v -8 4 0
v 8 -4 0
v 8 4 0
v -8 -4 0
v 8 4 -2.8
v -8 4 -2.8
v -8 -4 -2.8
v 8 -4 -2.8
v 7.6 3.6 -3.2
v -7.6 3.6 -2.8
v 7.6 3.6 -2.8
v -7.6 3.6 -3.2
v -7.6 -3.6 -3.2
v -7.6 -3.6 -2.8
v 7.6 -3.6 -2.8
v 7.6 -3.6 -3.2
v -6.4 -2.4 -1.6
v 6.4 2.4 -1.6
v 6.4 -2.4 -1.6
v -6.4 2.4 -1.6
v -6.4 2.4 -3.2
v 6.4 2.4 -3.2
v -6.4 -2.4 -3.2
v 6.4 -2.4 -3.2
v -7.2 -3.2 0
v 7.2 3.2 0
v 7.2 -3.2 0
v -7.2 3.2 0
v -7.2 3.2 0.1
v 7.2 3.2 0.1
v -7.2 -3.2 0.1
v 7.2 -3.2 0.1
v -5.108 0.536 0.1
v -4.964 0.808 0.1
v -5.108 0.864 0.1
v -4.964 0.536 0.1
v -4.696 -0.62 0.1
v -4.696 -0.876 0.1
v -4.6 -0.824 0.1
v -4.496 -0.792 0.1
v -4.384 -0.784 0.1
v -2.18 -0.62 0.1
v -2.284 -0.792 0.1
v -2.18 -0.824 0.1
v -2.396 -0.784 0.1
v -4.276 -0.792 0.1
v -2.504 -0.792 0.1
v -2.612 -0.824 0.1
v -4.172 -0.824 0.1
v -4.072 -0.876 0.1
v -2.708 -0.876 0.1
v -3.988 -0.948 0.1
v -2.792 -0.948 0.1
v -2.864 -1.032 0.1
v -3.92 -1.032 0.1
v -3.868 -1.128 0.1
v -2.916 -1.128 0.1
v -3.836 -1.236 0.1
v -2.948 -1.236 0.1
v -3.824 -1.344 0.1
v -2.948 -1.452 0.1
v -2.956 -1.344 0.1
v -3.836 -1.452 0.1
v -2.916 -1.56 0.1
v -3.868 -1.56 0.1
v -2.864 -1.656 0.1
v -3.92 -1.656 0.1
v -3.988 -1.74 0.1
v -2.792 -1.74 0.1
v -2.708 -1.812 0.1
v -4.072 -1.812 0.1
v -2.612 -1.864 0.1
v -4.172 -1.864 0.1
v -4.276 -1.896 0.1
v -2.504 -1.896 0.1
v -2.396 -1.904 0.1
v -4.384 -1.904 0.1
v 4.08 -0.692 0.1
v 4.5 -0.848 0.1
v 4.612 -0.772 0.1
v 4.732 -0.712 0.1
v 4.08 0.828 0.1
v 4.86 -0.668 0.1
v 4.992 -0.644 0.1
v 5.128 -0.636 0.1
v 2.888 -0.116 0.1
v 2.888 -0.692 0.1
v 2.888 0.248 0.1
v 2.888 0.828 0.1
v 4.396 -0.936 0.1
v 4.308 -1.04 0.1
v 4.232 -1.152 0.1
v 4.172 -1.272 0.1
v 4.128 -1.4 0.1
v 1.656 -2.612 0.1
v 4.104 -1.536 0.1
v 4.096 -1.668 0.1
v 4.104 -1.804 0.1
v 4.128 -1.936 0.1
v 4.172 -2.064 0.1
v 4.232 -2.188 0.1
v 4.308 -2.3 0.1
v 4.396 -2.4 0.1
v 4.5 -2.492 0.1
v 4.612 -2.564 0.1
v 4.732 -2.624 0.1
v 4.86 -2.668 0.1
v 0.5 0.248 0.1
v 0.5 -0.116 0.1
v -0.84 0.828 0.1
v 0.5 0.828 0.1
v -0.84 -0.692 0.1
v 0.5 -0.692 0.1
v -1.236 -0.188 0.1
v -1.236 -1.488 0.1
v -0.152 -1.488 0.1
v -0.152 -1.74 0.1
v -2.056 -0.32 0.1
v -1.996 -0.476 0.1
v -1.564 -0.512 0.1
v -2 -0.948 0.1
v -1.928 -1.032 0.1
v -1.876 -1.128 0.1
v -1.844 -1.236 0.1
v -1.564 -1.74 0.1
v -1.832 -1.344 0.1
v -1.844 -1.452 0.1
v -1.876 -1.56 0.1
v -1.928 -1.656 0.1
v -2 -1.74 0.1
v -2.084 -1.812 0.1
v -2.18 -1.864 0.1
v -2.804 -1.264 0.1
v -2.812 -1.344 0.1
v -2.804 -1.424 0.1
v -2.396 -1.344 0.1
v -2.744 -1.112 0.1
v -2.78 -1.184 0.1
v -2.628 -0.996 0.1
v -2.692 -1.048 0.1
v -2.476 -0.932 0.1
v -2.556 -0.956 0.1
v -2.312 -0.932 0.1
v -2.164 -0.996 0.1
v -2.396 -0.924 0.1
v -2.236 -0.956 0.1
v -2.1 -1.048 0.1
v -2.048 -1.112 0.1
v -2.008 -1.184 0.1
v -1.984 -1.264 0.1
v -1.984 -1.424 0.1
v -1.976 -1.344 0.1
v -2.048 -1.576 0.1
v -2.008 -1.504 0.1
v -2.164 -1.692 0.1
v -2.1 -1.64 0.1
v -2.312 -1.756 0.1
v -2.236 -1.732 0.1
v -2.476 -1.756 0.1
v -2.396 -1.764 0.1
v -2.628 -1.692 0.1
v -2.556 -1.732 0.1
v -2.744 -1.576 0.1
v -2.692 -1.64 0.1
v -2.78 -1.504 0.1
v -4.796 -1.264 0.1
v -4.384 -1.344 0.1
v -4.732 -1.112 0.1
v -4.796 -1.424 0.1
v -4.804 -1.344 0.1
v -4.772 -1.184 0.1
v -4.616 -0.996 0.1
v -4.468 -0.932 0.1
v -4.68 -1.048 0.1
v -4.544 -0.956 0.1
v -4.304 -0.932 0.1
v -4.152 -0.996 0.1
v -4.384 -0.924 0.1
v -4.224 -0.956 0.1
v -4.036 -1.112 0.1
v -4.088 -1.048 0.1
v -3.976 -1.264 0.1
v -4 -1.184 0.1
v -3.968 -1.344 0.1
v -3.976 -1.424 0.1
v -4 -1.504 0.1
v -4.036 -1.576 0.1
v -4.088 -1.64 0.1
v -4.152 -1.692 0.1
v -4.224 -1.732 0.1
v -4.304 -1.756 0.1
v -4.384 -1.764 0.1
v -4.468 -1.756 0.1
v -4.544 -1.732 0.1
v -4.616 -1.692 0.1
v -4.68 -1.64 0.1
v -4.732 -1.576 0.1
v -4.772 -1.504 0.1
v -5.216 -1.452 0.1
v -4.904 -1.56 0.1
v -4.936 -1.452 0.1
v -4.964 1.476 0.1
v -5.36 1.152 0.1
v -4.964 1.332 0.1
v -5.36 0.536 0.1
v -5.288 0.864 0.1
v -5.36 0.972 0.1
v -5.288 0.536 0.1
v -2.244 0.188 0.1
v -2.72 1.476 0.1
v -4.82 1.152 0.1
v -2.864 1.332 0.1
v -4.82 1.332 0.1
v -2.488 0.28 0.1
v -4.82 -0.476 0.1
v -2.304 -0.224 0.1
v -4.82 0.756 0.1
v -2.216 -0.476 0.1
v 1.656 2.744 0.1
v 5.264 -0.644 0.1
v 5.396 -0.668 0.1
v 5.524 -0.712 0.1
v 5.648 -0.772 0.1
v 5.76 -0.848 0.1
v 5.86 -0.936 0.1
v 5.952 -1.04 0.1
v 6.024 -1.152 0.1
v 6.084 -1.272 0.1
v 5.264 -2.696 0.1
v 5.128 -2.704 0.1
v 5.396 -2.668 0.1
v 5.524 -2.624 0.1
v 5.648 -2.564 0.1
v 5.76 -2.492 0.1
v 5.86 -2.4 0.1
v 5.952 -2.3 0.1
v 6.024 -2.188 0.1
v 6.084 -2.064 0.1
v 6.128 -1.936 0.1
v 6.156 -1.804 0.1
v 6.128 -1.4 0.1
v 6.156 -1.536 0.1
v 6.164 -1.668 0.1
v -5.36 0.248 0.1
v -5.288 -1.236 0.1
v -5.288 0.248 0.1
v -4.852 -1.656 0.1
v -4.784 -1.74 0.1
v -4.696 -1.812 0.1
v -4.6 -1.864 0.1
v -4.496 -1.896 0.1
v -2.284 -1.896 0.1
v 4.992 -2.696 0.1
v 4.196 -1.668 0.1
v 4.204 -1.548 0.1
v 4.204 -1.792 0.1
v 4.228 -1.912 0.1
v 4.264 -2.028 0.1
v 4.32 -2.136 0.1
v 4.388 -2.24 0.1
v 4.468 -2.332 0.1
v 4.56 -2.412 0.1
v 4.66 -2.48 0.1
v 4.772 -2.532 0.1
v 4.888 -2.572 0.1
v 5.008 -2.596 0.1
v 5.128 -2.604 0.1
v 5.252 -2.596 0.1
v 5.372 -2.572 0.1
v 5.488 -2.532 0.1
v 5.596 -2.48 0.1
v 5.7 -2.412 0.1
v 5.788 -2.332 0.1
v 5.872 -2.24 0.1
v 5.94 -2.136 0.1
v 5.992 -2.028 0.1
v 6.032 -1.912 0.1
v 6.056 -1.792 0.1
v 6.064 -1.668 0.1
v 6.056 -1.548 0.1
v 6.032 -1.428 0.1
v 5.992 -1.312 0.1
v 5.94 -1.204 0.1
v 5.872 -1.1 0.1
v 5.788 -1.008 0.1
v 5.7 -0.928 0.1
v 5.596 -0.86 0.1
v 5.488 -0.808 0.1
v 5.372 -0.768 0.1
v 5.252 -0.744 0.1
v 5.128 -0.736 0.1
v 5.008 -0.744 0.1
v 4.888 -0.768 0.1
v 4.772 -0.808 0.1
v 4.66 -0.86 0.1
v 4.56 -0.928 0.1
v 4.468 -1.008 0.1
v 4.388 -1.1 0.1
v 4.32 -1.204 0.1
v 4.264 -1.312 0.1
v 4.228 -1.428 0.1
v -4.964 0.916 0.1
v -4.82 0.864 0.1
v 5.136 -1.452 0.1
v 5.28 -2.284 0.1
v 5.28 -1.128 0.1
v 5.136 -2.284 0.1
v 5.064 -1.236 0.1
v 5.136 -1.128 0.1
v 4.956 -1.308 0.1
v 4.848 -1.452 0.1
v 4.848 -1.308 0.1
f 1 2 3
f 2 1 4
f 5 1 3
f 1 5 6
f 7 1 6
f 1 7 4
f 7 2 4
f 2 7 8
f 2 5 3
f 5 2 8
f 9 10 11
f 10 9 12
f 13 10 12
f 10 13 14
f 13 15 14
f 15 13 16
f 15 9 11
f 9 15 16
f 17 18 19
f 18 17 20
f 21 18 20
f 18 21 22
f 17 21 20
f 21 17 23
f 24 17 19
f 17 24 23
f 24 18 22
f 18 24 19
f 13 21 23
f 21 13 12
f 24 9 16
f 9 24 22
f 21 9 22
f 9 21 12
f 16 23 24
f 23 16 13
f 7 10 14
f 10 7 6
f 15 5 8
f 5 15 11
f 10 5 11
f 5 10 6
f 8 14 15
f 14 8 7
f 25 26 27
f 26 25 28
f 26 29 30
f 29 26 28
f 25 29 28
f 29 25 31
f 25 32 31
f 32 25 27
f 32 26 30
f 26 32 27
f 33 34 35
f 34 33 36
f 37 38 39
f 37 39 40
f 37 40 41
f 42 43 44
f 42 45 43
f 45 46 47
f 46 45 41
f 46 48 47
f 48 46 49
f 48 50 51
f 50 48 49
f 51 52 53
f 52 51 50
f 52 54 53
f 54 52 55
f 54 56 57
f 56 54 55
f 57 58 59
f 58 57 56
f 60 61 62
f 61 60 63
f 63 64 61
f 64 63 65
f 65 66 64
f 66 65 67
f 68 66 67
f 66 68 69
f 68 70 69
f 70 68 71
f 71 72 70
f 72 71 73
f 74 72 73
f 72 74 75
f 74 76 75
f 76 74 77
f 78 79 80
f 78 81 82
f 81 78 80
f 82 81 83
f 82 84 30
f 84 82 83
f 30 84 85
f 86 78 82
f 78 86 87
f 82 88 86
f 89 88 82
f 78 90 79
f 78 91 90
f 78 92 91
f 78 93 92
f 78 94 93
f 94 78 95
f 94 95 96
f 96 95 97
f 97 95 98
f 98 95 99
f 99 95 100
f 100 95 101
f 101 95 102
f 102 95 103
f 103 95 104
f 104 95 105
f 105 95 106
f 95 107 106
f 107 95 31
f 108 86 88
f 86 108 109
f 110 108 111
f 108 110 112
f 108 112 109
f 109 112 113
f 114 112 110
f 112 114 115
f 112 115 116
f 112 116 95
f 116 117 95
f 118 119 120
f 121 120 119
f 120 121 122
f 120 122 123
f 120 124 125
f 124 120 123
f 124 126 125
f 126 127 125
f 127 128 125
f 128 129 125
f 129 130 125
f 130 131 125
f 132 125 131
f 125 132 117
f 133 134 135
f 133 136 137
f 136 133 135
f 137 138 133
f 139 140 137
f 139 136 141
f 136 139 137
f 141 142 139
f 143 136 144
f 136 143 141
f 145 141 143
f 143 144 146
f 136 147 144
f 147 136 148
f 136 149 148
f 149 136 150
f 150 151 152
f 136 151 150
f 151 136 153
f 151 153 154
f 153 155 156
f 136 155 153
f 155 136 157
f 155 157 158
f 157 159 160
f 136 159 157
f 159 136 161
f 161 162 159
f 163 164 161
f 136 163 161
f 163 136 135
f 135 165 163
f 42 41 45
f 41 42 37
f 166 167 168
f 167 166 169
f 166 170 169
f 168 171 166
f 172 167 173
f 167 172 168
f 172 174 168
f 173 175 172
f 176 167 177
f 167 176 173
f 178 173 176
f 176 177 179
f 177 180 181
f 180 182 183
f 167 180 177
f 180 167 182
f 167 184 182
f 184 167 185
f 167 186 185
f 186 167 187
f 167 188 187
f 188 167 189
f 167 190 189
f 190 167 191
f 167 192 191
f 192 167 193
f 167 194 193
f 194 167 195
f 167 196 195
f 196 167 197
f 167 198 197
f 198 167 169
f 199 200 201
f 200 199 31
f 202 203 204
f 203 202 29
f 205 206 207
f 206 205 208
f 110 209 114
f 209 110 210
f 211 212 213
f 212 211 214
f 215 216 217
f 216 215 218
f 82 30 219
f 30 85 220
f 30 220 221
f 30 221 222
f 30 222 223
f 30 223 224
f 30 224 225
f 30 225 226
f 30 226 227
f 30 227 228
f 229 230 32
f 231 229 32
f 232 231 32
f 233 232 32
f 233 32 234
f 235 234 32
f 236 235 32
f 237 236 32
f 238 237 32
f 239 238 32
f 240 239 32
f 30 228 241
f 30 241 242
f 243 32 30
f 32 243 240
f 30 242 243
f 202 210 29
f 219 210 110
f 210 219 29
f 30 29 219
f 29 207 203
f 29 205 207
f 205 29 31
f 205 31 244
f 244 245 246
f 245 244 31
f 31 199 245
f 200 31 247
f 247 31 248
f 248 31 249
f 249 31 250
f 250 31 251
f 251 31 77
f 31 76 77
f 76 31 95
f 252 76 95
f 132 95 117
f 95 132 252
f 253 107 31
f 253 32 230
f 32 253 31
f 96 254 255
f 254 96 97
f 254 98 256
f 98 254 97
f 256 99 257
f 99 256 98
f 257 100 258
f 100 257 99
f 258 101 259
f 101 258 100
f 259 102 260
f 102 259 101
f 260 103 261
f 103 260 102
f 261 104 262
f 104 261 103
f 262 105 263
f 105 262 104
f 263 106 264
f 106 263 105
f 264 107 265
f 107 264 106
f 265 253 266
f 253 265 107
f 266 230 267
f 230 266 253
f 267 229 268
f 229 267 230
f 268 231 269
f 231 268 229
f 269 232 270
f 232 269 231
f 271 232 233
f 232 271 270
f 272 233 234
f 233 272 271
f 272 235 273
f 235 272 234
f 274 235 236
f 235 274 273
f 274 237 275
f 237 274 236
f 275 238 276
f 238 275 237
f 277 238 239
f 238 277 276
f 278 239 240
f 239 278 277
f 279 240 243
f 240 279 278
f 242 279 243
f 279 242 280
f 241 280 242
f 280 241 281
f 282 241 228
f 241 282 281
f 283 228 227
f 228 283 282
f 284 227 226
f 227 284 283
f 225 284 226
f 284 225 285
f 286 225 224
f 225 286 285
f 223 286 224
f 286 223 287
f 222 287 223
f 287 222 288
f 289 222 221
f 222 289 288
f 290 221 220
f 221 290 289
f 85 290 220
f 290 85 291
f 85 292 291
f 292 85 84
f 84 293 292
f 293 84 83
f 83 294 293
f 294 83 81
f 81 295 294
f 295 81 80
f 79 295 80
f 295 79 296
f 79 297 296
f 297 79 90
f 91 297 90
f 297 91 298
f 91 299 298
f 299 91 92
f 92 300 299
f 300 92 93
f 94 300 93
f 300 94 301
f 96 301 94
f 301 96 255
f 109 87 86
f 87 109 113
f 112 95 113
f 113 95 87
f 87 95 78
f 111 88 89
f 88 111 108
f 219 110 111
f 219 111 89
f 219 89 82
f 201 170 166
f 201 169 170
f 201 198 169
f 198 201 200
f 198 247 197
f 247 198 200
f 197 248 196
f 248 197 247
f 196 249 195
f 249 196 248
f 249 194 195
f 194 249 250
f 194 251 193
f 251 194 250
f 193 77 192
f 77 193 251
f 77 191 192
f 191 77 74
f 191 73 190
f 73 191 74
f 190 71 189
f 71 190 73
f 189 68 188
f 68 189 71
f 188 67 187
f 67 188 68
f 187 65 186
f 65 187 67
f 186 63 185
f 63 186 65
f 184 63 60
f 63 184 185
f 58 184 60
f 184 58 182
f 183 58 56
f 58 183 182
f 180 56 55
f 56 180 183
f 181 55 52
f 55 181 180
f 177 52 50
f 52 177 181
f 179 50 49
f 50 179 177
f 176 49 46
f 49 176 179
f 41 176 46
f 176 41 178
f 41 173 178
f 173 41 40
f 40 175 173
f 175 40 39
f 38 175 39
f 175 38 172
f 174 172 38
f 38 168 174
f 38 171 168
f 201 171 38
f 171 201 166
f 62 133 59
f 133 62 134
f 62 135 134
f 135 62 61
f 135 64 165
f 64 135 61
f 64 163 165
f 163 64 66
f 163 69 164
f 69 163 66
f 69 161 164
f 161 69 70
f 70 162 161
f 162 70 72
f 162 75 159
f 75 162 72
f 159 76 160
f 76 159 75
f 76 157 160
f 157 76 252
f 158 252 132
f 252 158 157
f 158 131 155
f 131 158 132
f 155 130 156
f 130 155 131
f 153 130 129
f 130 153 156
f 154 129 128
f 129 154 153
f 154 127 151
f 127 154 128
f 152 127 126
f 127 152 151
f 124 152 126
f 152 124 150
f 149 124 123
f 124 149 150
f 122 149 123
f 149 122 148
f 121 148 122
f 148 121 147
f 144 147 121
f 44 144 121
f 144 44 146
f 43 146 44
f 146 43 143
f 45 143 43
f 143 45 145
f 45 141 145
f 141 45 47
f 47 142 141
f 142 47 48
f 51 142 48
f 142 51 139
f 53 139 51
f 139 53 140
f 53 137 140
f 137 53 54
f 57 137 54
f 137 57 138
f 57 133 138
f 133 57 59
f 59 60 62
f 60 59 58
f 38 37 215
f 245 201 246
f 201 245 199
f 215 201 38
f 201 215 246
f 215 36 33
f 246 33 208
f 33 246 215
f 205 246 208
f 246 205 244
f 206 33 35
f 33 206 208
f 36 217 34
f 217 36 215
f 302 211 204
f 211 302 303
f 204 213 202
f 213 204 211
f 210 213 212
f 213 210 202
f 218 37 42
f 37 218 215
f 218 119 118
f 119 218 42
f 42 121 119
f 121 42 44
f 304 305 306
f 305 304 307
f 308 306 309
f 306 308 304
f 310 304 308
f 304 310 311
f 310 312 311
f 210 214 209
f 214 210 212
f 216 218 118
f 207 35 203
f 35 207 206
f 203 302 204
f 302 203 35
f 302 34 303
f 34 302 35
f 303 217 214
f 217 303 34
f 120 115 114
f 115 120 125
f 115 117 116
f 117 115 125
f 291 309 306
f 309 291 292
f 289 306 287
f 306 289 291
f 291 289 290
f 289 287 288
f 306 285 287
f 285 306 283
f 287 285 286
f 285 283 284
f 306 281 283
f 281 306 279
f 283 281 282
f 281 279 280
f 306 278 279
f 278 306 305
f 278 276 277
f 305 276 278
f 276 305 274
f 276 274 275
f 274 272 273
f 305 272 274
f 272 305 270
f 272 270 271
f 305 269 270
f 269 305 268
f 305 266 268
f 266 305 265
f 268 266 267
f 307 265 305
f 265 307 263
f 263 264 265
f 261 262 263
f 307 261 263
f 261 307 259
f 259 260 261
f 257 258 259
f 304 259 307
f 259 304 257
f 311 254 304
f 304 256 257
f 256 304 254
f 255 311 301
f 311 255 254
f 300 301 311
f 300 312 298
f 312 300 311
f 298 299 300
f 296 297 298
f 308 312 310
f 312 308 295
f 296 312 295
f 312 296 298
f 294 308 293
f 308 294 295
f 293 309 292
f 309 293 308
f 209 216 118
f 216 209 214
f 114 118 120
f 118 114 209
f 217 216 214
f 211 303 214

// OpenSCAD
use <../lib.scad>
use <3069b.scad>
use <821577c.scad>
function ldraw_lib__3069bd1s() = [
// 0 Tile  1 x  2 with Forklift, Red Up and Down Arrows and "1" in Yellow Circle Sticker
// 0 Name: 3069bd1s.dat
// 0 Author: Evert-Jan Boer [ejboer]
// 0 !LDRAW_ORG Shortcut UPDATE 2026-07
// 0 !LICENSE Licensed under CC BY 4.0 : see CAreadme.txt
// 
// 0 BFC CERTIFY CCW
  [0,"BFC","CERTIFY"],
  [0,"BFC","CCW"],
// 
// 0 !CATEGORY Sticker Shortcut
// 0 !KEYWORDS Bricklink 3069pb0097, Set 8082
// 
// 0 !HISTORY 2026-07-30 [OrionP] Official Update 2026-07
// 
// 1 16 0 0 0 1 0 0 0 1 0 0 0 1 3069b.dat
  [1,16,0,0,0,1,0,0,0,1,0,0,0,1, ldraw_lib__3069b()],
// 1 16 0 0 0 1 0 0 0 1 0 0 0 1 821577c.dat
  [1,16,0,0,0,1,0,0,0,1,0,0,0,1, ldraw_lib__821577c()],
];
module ldraw_lib__3069bd1s(step=0, col=false, unit=2/5, alt=false, line=0.2, solid=!$preview)
    makepoly(ldraw_lib__3069bd1s(), step=step, col=col, unit=unit, alt=alt, line=line, solid=solid);
ldraw_lib__3069bd1s(line=0.2);
